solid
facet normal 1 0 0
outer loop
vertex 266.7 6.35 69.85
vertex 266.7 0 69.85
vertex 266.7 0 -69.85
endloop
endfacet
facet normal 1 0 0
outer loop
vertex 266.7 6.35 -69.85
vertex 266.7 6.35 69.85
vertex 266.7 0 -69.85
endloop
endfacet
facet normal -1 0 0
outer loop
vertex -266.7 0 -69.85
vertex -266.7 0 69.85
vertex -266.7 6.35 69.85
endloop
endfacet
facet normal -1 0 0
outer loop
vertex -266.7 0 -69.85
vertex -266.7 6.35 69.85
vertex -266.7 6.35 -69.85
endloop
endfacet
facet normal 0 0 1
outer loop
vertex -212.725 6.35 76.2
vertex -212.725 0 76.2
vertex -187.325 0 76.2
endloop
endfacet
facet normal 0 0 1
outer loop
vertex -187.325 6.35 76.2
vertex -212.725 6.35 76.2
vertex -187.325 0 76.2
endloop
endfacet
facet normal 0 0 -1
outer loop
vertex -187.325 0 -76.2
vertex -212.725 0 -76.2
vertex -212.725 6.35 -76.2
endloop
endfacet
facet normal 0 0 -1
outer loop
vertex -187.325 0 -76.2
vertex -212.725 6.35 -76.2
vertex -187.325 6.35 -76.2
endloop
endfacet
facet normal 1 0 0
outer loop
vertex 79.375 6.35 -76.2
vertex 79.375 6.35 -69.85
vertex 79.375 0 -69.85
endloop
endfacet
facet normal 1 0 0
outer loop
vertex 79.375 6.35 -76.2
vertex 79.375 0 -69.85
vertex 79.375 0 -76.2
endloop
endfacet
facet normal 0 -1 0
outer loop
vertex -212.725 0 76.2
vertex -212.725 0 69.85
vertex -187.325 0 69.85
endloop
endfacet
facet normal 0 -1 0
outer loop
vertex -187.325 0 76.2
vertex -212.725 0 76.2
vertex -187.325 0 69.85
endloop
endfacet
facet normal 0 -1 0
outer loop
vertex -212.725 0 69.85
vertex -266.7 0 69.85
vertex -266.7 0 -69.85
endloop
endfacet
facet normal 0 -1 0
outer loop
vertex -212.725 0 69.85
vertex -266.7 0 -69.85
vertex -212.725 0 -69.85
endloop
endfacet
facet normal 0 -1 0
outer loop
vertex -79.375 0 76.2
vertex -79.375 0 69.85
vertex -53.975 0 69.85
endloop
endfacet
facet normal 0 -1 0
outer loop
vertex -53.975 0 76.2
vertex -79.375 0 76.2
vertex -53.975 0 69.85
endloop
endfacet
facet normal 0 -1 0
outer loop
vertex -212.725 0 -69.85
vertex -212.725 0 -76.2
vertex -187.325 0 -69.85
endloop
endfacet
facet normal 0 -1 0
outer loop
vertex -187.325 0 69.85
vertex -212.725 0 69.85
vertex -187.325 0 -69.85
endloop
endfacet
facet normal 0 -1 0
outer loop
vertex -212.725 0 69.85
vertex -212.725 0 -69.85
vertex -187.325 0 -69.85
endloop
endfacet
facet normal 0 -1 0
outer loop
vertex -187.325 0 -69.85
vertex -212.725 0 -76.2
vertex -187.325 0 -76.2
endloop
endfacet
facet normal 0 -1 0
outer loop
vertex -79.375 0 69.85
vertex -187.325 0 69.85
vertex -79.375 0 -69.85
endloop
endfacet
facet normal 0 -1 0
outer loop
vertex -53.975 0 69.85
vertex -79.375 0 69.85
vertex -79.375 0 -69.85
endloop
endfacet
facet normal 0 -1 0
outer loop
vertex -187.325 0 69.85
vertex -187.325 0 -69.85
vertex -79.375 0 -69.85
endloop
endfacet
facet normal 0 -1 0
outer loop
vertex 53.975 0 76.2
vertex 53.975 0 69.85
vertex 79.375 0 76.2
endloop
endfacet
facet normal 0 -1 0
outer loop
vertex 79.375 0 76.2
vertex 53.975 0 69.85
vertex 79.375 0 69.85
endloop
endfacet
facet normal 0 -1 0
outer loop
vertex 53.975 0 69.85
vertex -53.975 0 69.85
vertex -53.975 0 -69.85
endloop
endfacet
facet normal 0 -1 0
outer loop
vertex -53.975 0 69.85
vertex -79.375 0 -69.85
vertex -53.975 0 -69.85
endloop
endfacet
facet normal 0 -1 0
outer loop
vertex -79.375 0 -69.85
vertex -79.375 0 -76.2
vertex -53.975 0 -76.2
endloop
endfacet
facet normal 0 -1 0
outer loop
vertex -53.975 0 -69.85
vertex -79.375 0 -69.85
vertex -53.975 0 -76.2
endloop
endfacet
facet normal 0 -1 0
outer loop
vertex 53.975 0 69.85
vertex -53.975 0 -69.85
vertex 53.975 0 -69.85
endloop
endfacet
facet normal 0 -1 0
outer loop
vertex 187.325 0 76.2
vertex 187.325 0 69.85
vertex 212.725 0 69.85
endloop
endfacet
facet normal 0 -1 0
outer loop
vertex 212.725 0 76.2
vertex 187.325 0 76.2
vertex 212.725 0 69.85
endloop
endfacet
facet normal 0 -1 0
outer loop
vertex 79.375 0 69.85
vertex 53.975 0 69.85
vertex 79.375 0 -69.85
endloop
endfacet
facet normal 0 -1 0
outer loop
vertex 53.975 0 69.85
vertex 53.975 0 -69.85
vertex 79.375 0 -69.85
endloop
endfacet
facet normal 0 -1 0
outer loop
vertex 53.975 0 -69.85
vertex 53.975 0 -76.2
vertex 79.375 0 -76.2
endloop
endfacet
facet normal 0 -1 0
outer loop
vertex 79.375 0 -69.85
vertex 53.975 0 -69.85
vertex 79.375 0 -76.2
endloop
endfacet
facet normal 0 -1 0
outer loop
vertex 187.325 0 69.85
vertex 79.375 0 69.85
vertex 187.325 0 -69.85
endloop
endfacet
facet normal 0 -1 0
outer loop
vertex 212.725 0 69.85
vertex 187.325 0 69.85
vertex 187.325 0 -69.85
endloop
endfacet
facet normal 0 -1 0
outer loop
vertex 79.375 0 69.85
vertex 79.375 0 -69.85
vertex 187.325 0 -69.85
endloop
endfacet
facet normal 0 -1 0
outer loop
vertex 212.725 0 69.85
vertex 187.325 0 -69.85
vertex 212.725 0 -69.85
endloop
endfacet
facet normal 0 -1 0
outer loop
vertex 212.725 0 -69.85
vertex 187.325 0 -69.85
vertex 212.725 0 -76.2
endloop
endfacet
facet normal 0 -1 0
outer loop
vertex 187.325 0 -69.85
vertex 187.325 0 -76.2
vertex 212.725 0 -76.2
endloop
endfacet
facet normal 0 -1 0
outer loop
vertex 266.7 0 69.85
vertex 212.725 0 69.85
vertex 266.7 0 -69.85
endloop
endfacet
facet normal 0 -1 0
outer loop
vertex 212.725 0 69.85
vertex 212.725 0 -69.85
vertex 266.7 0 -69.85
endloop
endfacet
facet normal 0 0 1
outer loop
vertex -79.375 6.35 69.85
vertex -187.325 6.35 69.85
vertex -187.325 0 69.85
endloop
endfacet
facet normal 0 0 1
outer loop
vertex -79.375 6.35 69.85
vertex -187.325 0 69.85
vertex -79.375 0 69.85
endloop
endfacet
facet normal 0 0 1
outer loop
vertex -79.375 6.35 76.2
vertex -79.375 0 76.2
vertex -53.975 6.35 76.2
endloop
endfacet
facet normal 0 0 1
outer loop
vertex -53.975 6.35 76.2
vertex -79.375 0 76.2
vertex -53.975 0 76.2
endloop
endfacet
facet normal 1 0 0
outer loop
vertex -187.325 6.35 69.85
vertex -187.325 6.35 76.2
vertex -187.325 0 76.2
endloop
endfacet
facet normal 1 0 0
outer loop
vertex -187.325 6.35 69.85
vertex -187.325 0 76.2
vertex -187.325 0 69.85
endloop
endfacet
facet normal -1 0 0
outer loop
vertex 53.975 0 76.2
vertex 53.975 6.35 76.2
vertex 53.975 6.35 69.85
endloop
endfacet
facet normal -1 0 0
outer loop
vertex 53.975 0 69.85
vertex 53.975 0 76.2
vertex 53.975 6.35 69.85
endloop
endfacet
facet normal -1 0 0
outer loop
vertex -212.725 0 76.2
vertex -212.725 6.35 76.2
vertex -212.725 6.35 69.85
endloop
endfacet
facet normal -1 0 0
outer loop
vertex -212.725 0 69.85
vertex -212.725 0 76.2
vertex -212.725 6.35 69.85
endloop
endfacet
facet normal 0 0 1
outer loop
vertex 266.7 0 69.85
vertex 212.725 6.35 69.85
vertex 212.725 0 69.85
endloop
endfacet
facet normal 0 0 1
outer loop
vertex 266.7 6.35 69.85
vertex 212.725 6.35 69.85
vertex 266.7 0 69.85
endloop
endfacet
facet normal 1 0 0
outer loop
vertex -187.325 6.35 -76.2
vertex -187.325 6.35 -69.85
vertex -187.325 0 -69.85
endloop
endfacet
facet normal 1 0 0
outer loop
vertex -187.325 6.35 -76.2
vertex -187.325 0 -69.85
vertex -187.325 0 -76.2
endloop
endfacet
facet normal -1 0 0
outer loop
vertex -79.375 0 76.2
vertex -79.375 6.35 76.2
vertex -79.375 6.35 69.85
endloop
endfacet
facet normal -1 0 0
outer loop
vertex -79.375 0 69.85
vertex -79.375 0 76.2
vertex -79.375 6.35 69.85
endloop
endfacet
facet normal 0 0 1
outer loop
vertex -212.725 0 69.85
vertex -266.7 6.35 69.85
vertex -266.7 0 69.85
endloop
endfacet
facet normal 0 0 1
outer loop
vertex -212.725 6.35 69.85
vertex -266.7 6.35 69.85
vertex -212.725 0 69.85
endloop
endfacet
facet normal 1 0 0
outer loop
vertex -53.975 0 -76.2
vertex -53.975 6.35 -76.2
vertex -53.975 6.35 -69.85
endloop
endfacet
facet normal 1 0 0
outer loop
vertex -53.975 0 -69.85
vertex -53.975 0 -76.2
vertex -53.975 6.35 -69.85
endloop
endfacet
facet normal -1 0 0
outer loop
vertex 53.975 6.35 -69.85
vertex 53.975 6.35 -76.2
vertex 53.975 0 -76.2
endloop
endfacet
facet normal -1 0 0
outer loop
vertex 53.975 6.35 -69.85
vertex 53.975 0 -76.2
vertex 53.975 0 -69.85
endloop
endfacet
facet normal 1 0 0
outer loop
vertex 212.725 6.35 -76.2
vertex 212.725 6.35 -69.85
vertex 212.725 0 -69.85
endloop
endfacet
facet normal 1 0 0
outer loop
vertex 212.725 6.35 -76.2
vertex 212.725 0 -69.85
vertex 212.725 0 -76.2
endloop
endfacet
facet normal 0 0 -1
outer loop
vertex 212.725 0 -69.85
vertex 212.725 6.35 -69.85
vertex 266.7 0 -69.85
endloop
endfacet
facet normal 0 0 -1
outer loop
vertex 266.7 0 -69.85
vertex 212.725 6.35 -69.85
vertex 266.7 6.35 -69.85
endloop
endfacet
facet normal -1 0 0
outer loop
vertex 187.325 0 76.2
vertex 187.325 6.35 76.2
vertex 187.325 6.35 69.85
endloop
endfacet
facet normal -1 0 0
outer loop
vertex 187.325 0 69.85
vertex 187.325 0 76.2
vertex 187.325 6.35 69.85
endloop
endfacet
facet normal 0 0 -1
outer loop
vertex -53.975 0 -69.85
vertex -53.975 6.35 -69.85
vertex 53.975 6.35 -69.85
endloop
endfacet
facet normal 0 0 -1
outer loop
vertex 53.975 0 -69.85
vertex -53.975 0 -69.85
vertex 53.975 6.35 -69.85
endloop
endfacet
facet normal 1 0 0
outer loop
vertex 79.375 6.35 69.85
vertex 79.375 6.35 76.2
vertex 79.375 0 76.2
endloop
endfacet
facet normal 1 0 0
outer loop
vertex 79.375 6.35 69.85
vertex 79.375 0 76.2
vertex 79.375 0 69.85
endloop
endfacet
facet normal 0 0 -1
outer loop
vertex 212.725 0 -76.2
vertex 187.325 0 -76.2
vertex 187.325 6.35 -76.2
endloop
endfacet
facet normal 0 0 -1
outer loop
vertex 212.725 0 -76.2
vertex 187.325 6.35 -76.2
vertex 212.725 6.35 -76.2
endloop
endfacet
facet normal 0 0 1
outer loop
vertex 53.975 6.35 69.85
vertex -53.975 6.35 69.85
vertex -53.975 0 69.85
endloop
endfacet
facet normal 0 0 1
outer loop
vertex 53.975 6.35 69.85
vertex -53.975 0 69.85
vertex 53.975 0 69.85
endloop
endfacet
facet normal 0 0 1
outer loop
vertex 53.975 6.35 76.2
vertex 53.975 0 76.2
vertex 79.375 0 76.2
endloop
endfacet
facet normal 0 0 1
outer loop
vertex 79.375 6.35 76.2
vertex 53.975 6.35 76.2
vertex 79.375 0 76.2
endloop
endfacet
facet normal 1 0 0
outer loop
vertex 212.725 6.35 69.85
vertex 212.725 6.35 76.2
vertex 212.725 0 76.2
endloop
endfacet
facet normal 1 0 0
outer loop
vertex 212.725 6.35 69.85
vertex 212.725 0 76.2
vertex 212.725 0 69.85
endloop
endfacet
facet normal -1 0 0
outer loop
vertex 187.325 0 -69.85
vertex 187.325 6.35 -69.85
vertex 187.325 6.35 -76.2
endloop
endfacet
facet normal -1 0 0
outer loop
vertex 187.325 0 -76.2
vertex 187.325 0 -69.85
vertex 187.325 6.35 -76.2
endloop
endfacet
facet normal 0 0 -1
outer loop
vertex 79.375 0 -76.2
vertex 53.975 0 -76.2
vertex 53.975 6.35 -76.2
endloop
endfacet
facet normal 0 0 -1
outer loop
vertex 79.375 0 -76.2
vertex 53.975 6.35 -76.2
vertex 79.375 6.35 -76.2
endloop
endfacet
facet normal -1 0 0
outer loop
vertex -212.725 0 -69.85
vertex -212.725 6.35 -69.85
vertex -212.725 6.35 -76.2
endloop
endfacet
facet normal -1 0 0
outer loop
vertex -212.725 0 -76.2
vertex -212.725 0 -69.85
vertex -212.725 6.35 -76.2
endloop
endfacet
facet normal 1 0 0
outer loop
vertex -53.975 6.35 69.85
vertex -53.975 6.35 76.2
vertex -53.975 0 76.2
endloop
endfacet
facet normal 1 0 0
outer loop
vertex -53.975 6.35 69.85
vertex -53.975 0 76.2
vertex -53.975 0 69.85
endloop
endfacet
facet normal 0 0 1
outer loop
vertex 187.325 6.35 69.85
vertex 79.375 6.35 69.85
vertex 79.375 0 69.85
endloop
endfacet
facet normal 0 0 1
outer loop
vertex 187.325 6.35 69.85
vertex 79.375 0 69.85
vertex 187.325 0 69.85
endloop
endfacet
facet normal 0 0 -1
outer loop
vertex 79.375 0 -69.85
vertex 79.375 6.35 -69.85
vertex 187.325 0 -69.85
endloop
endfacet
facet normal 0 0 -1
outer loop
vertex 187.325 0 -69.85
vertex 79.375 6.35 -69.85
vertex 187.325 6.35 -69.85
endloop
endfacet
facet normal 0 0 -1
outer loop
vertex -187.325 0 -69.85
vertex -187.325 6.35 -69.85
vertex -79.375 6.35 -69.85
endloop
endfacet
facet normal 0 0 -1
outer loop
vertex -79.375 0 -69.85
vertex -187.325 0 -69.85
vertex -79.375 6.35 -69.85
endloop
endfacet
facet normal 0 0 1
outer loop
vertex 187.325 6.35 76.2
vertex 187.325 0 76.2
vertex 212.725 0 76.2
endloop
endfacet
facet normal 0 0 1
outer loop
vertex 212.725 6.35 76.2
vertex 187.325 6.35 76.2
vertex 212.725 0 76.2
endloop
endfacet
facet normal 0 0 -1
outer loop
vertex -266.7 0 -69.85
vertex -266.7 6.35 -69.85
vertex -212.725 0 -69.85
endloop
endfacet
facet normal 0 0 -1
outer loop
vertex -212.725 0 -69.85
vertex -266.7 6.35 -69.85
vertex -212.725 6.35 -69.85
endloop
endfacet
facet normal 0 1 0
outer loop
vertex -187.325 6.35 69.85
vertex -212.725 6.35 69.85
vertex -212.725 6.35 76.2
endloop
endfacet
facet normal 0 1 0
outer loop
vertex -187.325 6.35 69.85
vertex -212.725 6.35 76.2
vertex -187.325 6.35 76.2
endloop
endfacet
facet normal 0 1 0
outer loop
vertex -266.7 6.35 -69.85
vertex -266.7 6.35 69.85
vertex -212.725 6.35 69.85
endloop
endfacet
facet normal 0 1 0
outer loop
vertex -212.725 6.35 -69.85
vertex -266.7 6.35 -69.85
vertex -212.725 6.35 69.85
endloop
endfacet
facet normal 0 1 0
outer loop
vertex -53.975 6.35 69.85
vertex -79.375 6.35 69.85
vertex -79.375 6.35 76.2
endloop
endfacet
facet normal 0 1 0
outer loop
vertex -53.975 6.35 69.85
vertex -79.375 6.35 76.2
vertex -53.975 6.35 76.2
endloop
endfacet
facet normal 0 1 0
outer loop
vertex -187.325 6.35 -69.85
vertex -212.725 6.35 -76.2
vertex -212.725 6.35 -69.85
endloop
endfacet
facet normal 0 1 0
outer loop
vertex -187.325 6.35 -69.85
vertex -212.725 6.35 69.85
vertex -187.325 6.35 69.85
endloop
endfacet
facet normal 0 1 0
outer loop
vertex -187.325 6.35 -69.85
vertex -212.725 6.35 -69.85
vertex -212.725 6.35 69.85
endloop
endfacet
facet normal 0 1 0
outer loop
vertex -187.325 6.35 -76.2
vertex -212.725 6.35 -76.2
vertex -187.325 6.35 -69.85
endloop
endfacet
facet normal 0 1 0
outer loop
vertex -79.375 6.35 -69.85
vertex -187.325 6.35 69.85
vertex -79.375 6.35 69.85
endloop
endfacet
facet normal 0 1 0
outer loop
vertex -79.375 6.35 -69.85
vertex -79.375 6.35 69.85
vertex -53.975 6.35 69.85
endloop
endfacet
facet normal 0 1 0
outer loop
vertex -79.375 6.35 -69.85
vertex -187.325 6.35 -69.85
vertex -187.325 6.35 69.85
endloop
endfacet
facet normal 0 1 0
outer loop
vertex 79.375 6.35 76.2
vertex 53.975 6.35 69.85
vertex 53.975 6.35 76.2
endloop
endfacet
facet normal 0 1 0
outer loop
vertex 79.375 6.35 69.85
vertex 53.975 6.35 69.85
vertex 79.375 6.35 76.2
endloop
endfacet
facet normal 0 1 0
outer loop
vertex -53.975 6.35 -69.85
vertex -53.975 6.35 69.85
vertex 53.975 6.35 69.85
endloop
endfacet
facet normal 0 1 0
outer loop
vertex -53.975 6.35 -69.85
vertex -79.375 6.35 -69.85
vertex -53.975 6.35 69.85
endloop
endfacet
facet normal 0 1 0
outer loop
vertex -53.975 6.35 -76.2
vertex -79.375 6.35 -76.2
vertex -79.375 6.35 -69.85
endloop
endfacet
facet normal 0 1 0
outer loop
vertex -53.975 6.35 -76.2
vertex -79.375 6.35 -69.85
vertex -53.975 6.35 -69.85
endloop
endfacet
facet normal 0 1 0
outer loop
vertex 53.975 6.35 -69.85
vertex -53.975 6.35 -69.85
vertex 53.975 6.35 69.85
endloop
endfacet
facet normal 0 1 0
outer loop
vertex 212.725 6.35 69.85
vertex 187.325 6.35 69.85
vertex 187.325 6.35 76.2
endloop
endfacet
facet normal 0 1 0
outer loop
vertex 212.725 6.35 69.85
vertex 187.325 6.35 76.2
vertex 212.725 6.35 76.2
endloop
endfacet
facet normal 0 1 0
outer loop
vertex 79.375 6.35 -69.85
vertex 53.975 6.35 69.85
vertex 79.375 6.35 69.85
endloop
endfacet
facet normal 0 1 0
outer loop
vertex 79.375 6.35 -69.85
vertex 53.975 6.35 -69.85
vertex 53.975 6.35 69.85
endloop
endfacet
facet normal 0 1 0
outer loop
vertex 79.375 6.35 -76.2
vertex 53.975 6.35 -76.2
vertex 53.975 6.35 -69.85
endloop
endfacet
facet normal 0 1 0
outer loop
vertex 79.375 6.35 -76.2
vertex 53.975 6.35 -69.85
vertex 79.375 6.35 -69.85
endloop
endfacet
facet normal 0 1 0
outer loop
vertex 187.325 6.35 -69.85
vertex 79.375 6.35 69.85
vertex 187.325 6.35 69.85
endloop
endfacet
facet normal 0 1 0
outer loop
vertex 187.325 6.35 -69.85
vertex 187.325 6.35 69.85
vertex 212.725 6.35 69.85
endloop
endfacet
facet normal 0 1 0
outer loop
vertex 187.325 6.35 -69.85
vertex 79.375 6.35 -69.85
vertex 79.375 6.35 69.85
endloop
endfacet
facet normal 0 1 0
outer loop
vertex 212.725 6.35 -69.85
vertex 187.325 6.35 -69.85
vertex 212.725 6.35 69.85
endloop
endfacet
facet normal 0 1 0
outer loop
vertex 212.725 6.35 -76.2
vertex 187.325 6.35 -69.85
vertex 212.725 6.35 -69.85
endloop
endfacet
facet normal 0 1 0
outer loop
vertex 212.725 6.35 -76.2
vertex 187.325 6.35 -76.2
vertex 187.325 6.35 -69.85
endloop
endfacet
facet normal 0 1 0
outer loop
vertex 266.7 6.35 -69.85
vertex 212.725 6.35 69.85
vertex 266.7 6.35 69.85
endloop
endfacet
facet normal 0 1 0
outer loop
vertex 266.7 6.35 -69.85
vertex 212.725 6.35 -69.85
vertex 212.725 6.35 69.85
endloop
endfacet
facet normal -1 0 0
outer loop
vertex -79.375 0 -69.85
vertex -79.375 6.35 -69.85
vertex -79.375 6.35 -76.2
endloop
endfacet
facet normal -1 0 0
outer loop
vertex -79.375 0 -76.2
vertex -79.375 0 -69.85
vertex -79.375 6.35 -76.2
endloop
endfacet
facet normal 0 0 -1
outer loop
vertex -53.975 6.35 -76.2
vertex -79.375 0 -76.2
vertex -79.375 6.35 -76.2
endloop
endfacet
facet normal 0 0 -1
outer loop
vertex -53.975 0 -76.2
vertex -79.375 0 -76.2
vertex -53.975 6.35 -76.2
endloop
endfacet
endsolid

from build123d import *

# Parameters (mm, degrees)
SKETCH1_W               = 533.4
SKETCH1_H               = 152.4
BOSS_EXTRUDE1_DEPTH     = 6.35
SKETCH2_W               = 107.95
SKETCH2_H               = 6.35
CUT_EXTRUDE2_DEPTH      = 7.35
LPATTERN1_COUNT         = 3
LPATTERN1_PITCH         = 133.35
LPATTERN1_COL_COUNT     = 3
LPATTERN1_COL_PITCH     = 133.35
MIRROR2_COPY_1_SKETCH_W = 107.95
MIRROR2_COPY_1_SKETCH_H = 6.35
MIRROR2_COPY_1_DEPTH    = 7.35
MIRROR2_COPY_2_SKETCH_W = 107.95
MIRROR2_COPY_2_SKETCH_H = 6.35
MIRROR2_COPY_2_DEPTH    = 7.35
MIRROR2_COPY_3_SKETCH_W = 107.95
MIRROR2_COPY_3_SKETCH_H = 6.35
MIRROR2_COPY_3_DEPTH    = 7.35
MIRROR2_COPY_4_SKETCH_W = 107.95
MIRROR2_COPY_4_SKETCH_H = 6.35
MIRROR2_COPY_4_DEPTH    = 7.35


with BuildPart() as part:
    # Sketch1 → Boss-Extrude1 (new body)
    with BuildSketch(Plane(origin=(0, 0, 0), x_dir=(1, 0, 0), z_dir=(0, 1, 0))):
        Rectangle(SKETCH1_W, SKETCH1_H)
    extrude(amount=BOSS_EXTRUDE1_DEPTH)

    # Sketch2 → Cut-Extrude2 (cut, through all)
    with BuildSketch(Plane(origin=(0, 6.35, 0), x_dir=(1, 0, 0), z_dir=(0, 1, 0))):
        with Locations((0, -73.025)):
            Rectangle(SKETCH2_W, SKETCH2_H)
    cut_extrude2 = extrude(amount=-CUT_EXTRUDE2_DEPTH, mode=Mode.SUBTRACT)

    # LPattern1: Cut-Extrude2 ×3
    with Locations(*[(-i * LPATTERN1_PITCH, 0, 0) for i in range(1, LPATTERN1_COUNT)]):
        add(cut_extrude2, mode=Mode.SUBTRACT)

    # LPattern1 col: Cut-Extrude2 ×3
    with Locations(*[(i * LPATTERN1_COL_PITCH, 0, 0) for i in range(1, LPATTERN1_COL_COUNT)]):
        add(cut_extrude2, mode=Mode.SUBTRACT)

    # Mirror2: Cut-Extrude2 across plane
    add(cut_extrude2.mirror(Plane.XY), mode=Mode.SUBTRACT)

    # Mirror2 copy 1 sketch → Mirror2 copy 1 (cut, through all)
    with BuildSketch(Plane(origin=(-133.35, 6.35, 0), x_dir=(1, 0, 0), z_dir=(0, 1, 0))):
        with Locations((0, 73.025)):
            Rectangle(MIRROR2_COPY_1_SKETCH_W, MIRROR2_COPY_1_SKETCH_H)
    extrude(amount=-MIRROR2_COPY_1_DEPTH, mode=Mode.SUBTRACT)

    # Mirror2 copy 2 sketch → Mirror2 copy 2 (cut, through all)
    with BuildSketch(Plane(origin=(-266.7, 6.35, 0), x_dir=(1, 0, 0), z_dir=(0, 1, 0))):
        with Locations((0, 73.025)):
            Rectangle(MIRROR2_COPY_2_SKETCH_W, MIRROR2_COPY_2_SKETCH_H)
    extrude(amount=-MIRROR2_COPY_2_DEPTH, mode=Mode.SUBTRACT)

    # Mirror2 copy 3 sketch → Mirror2 copy 3 (cut, through all)
    with BuildSketch(Plane(origin=(133.35, 6.35, 0), x_dir=(1, 0, 0), z_dir=(0, 1, 0))):
        with Locations((0, 73.025)):
            Rectangle(MIRROR2_COPY_3_SKETCH_W, MIRROR2_COPY_3_SKETCH_H)
    extrude(amount=-MIRROR2_COPY_3_DEPTH, mode=Mode.SUBTRACT)

    # Mirror2 copy 4 sketch → Mirror2 copy 4 (cut, through all)
    with BuildSketch(Plane(origin=(266.7, 6.35, 0), x_dir=(1, 0, 0), z_dir=(0, 1, 0))):
        with Locations((0, 73.025)):
            Rectangle(MIRROR2_COPY_4_SKETCH_W, MIRROR2_COPY_4_SKETCH_H)
    extrude(amount=-MIRROR2_COPY_4_DEPTH, mode=Mode.SUBTRACT)


solid = part.part
